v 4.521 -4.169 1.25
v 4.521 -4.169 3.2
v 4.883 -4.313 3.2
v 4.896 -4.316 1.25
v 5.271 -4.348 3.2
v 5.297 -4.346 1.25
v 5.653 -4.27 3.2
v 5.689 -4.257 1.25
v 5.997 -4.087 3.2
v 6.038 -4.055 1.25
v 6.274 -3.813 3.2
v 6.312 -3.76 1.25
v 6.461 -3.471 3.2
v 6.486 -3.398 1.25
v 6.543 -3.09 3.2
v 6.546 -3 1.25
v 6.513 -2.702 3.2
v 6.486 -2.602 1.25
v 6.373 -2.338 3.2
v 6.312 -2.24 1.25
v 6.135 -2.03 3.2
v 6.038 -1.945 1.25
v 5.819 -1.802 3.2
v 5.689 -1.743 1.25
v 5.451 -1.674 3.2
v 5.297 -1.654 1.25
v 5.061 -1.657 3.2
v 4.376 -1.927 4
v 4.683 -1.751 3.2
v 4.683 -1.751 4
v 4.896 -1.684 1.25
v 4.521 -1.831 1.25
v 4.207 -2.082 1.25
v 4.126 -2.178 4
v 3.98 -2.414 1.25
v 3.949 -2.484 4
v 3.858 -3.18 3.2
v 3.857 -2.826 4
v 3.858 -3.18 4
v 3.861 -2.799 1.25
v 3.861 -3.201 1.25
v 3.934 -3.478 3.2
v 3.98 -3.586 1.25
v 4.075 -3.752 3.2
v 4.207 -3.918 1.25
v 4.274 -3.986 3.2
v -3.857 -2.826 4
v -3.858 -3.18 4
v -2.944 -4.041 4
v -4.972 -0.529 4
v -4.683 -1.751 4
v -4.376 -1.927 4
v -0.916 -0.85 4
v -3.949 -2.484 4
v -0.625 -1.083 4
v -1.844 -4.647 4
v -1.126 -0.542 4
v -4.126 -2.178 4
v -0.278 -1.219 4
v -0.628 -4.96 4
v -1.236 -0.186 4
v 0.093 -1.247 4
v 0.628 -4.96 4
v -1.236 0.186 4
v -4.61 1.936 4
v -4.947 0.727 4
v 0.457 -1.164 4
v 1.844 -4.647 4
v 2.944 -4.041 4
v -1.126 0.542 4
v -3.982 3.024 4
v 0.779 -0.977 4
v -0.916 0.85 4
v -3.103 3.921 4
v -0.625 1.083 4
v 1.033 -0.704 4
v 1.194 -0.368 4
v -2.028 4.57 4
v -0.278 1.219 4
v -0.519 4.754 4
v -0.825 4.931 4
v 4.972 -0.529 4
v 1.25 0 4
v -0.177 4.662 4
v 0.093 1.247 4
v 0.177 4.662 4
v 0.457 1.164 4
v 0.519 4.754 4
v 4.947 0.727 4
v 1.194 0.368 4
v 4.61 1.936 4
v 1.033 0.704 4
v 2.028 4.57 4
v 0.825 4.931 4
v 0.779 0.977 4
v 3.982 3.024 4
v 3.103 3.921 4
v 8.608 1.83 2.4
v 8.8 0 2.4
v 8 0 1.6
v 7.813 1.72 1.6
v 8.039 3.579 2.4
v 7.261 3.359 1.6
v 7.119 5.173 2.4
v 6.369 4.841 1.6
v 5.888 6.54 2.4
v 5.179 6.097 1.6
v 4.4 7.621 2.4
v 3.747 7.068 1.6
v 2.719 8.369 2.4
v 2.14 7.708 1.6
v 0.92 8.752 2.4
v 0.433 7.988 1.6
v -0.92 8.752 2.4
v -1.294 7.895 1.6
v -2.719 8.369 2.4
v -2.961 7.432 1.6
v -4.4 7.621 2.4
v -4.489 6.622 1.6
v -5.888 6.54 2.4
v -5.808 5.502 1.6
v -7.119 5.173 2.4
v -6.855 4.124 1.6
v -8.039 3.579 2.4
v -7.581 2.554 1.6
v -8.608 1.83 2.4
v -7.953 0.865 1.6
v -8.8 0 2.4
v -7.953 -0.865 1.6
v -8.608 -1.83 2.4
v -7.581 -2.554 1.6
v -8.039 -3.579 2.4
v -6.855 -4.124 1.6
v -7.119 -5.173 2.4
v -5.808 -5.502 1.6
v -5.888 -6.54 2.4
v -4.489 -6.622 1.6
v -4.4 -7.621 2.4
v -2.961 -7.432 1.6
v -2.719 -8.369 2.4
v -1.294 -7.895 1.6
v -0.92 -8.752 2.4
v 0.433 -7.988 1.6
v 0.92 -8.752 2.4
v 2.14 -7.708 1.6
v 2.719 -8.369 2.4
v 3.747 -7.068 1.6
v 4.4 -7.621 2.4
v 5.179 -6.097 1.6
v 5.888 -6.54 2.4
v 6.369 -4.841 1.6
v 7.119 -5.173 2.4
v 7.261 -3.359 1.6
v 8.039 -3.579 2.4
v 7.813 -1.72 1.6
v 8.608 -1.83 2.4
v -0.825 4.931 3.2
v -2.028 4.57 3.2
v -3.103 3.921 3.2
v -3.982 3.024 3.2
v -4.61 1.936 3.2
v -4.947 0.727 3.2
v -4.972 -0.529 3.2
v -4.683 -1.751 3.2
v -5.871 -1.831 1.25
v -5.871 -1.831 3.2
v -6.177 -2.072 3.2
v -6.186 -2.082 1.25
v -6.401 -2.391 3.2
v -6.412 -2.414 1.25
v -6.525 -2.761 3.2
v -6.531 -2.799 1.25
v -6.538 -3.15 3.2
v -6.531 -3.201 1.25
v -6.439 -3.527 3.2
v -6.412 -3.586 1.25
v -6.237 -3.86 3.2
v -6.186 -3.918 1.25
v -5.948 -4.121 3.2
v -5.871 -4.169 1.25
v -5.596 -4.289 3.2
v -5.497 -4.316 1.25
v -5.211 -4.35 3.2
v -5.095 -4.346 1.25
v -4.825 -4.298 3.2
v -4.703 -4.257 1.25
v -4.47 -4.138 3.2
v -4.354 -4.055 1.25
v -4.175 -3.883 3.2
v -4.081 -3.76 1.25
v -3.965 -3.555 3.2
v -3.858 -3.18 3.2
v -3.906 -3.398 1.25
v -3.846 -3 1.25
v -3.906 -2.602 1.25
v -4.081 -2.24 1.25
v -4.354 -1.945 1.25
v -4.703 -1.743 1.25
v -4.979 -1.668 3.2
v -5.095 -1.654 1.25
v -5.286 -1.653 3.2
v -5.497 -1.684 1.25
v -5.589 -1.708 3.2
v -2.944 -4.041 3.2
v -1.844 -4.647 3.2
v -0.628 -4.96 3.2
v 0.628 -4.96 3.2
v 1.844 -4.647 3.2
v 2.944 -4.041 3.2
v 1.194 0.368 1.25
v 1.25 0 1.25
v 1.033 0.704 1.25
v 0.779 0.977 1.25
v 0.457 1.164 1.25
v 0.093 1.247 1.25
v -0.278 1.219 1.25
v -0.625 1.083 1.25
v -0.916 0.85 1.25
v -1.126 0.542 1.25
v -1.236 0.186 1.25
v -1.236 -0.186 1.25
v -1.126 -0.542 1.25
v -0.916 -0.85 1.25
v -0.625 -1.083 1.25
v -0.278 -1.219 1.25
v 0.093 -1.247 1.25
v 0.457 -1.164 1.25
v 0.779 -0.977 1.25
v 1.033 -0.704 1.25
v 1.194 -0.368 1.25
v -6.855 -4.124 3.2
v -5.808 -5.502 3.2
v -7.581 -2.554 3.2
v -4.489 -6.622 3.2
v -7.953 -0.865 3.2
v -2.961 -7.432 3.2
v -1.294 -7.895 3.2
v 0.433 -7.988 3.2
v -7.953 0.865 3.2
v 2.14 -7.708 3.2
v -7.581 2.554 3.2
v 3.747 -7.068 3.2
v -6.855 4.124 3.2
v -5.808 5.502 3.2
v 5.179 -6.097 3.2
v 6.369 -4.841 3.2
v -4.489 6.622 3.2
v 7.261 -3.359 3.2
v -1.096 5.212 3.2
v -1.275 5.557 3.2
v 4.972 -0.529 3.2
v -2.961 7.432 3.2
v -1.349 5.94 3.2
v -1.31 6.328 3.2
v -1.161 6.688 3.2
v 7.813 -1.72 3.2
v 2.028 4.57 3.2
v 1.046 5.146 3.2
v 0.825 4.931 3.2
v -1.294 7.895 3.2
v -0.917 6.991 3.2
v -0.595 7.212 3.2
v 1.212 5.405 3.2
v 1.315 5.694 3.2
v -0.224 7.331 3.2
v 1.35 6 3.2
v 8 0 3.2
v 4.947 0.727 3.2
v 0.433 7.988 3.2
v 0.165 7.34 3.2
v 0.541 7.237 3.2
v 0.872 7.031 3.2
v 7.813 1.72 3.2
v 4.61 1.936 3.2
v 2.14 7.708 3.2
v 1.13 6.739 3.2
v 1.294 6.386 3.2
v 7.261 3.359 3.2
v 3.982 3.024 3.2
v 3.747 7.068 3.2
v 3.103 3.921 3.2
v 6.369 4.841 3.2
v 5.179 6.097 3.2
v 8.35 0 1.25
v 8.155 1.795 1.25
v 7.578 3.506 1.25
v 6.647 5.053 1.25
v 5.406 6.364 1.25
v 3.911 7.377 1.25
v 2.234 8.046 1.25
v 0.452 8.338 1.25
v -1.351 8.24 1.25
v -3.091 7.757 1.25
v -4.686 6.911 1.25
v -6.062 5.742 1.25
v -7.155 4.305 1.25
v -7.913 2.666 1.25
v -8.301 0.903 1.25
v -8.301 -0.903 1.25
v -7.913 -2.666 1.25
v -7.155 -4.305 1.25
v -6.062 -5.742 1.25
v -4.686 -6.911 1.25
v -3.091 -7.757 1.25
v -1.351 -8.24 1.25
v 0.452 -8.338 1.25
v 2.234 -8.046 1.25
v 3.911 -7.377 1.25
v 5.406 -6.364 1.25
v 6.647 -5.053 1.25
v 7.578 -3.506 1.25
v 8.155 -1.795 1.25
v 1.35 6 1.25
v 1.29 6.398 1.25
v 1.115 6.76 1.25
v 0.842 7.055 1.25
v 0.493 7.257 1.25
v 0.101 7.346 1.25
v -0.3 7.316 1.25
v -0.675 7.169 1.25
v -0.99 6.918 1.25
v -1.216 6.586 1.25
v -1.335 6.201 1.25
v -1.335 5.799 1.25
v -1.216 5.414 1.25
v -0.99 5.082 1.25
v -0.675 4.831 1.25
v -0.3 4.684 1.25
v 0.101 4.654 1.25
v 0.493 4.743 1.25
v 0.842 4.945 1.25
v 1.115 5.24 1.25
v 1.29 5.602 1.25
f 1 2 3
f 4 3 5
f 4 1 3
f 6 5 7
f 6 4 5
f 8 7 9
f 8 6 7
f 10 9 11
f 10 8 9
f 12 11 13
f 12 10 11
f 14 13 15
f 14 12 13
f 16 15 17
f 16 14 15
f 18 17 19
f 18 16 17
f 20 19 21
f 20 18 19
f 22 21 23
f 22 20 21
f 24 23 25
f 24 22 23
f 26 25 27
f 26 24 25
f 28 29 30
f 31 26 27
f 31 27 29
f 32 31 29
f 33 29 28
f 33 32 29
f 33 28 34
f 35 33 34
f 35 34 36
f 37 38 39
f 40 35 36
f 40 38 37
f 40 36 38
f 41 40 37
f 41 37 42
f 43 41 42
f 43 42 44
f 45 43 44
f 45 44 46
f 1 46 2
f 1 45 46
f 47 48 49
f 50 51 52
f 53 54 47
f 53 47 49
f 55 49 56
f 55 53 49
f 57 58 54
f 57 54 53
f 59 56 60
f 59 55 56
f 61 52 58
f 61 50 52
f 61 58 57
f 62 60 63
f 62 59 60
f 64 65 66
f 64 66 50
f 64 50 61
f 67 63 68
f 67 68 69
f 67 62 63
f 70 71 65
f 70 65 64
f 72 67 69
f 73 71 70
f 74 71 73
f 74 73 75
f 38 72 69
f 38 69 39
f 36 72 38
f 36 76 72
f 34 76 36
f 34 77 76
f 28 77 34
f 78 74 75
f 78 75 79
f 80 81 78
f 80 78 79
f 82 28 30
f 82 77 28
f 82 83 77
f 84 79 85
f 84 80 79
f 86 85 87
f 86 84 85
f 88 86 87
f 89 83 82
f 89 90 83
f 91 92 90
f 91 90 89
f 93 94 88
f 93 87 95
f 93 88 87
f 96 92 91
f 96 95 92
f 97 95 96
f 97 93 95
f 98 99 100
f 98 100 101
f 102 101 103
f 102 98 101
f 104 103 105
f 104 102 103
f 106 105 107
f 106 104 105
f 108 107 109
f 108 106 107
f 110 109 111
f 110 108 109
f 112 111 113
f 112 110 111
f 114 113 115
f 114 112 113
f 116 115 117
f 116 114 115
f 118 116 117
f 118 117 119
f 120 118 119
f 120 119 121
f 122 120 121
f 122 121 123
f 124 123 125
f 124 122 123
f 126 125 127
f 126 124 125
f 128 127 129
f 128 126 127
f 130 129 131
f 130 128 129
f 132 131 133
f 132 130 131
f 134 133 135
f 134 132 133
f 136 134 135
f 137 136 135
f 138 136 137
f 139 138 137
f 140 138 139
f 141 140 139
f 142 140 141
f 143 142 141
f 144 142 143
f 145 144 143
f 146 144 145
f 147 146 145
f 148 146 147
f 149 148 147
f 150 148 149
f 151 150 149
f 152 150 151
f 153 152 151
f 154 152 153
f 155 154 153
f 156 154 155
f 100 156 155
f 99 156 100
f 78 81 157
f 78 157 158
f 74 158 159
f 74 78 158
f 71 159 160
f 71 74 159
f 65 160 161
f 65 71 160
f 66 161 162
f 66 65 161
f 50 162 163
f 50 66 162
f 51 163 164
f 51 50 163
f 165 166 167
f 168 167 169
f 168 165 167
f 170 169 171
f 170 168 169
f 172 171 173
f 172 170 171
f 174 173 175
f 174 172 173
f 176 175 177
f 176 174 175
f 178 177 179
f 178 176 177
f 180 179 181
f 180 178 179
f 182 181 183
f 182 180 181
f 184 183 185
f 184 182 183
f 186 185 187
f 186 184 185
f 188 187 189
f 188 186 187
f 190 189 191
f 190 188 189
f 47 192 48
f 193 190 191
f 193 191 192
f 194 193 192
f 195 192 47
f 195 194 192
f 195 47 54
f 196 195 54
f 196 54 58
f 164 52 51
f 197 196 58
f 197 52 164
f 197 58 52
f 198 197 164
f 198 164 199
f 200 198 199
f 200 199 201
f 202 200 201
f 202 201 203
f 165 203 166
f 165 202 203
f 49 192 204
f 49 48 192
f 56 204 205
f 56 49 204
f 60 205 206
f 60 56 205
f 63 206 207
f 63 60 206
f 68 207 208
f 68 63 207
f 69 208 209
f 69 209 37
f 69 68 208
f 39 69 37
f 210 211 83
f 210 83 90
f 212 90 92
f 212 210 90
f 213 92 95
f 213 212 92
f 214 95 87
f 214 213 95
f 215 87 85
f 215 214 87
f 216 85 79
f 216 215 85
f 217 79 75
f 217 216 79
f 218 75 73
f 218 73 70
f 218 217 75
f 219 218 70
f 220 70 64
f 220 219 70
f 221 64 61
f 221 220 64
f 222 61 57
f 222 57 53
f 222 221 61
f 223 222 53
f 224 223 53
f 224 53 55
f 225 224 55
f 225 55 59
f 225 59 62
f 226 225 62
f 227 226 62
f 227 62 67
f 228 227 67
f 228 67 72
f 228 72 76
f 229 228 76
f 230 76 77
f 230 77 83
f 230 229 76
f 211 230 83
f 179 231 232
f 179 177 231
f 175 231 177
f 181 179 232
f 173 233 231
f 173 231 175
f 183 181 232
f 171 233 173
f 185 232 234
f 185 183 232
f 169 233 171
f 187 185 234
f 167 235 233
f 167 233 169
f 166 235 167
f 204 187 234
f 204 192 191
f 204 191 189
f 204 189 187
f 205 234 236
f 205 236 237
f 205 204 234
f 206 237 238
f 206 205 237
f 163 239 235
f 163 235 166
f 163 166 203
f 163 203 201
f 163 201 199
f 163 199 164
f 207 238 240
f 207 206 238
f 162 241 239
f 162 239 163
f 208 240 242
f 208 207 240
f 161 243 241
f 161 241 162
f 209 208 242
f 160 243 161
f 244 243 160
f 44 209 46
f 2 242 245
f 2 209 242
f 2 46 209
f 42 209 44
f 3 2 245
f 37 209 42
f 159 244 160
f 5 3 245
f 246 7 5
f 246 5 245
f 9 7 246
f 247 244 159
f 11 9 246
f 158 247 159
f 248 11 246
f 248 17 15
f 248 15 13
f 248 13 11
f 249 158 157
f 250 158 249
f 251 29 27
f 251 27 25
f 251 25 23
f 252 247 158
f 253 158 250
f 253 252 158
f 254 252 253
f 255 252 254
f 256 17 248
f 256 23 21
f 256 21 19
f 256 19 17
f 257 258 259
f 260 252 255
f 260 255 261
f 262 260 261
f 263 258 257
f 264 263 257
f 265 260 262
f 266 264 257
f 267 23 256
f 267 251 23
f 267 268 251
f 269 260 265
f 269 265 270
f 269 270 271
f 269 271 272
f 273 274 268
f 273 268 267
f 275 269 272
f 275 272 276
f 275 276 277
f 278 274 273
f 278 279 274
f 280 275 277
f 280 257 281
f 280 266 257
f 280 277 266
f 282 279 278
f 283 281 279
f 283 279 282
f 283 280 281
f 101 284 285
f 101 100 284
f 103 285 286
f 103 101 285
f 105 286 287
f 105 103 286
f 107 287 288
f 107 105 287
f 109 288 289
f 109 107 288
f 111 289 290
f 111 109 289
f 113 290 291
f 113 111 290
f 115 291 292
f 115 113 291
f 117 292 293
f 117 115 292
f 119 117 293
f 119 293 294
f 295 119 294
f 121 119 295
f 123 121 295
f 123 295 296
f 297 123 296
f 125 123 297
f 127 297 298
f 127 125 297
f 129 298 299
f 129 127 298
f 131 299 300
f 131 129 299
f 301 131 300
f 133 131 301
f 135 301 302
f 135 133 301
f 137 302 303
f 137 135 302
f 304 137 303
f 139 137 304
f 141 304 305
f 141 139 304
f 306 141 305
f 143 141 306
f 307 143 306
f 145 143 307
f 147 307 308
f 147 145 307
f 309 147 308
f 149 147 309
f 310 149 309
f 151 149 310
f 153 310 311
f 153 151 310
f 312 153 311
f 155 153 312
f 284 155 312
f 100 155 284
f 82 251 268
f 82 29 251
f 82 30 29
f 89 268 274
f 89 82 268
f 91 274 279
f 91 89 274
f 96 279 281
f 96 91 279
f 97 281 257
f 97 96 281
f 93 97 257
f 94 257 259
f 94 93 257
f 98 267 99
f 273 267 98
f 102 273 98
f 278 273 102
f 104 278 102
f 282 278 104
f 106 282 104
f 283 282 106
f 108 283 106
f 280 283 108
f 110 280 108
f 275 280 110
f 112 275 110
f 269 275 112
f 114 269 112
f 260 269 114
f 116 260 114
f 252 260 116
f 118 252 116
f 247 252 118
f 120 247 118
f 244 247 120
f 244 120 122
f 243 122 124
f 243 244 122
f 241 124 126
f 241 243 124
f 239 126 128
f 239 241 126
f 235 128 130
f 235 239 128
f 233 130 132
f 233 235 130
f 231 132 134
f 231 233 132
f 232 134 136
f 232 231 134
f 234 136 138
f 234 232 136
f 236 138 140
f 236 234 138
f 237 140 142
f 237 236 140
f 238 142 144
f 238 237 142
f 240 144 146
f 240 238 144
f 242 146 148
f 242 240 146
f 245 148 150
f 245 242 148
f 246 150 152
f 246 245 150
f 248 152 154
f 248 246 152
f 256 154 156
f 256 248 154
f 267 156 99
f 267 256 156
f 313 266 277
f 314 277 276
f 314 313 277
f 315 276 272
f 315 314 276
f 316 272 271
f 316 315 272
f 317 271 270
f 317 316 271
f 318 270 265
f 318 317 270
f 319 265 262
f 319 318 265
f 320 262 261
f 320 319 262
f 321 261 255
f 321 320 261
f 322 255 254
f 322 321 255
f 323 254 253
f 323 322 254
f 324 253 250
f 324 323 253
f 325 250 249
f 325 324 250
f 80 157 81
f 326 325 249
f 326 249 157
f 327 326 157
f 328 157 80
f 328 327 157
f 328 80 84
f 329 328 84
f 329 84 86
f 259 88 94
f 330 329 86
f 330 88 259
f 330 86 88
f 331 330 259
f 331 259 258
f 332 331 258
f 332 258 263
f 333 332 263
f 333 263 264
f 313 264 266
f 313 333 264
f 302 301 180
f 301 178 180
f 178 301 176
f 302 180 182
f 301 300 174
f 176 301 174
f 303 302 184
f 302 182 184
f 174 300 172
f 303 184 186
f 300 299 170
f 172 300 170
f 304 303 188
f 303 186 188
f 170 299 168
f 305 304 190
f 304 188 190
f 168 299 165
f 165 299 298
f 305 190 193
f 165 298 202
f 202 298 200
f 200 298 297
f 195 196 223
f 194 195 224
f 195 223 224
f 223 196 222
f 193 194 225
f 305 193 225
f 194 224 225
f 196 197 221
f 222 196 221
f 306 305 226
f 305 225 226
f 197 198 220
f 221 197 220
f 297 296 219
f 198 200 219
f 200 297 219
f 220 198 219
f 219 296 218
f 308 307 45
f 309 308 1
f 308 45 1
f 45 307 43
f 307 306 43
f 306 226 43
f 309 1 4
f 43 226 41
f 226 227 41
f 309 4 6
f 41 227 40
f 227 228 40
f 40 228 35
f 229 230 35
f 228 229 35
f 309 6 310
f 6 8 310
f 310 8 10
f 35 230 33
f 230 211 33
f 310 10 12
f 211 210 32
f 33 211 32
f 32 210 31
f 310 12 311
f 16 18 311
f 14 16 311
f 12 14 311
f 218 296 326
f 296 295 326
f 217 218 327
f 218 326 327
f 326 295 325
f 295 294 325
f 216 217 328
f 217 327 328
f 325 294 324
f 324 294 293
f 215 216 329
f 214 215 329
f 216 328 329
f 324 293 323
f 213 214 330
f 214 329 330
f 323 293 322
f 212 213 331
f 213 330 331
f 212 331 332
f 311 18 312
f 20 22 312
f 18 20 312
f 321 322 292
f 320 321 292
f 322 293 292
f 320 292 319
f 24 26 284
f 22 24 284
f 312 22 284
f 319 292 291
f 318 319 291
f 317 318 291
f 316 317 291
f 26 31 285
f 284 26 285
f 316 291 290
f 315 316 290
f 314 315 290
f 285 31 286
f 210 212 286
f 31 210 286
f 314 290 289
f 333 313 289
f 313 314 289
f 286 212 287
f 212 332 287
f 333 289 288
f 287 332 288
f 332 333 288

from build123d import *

# Parameters (mm, degrees)
CYLINDER002_R     = 20
CYLINDER002_DEPTH = 20
CYLINDER001_R     = 1.35
CYLINDER001_DEPTH = 10
ARRAY001_COUNT    = 3
CYLINDER_R        = 4.1
CYLINDER_DEPTH    = 2.25
SKETCH002_W       = 5
SKETCH002_H       = 4.7
ARRAY_Z_COUNT     = 6
ARRAY_Z_PITCH     = 1.6


with BuildPart() as upperdomain:
    # Cylinder002 → Cylinder002 (new body)
    with BuildSketch(Plane.XY.offset(1.25)):
        Circle(CYLINDER002_R)
    extrude(amount=CYLINDER002_DEPTH)


with BuildPart() as dins913:
    # Cylinder001 → Cylinder001 (new body)
    with BuildSketch(Plane(origin=(0, 6, -4), x_dir=(1, 0, 0), z_dir=(0, 0, 1))):
        Circle(CYLINDER001_R)
    extrude(amount=CYLINDER001_DEPTH)

    # Array001: DINs913 ×3 about axis
    array001_axis = Axis((0, 0, 0), (0, 0, 1))


with BuildPart() as dins913_1:
    add(dins913.part)
    for i in range(1, ARRAY001_COUNT):
        add(dins913.part.rotate(array001_axis, i * 360 / ARRAY001_COUNT))


with BuildPart() as lensfit:
    # Cylinder → Cylinder (new body)
    with BuildSketch(Plane.XY.offset(-1)):
        Circle(CYLINDER_R)
    extrude(amount=CYLINDER_DEPTH)


with BuildPart() as innergroovedom001:
    # Sketch002 → Revolution002 (revolve)
    with BuildSketch(Plane.XZ):
        with Locations((7.5, 0.85)):
            Rectangle(SKETCH002_W, SKETCH002_H)
    revolve(axis=Axis((0, 0, 0), (0, 0, 1)))


with BuildPart() as innergroovetool:
    # Sketch001 → Revolution001 (revolve)
    with BuildSketch(Plane.XZ):
        Polygon((4, 3.2), (4, 1.6), (8, 1.6), (8.8, 2.4), (8, 3.2), align=None)
    revolve(axis=Axis((0, 0, 0), (0, 0, 1)))

    # Array Z: InnerGrooveTool ×6


with BuildPart() as innergroovetool_1:
    add(innergroovetool.part)
    with Locations(*[(0, 0, -i * ARRAY_Z_PITCH) for i in range(1, ARRAY_Z_COUNT)]):
        add(innergroovetool.part)

    # Common: intersect InnerGrooveDom001
    add(innergroovedom001.part, mode=Mode.INTERSECT)


with BuildPart() as lid:
    # Sketch → Revolution (revolve)
    with BuildSketch(Plane.XZ):
        Polygon((1.25, 4), (1.25, -1.5), (8, -1.5), (8, 3.2), (5, 3.2), (5, 4), align=None)
    revolve(axis=Axis((0, 0, 0), (0, 0, 1)))

    # Fusion001: union InnerGrooveTool
    add(innergroovetool_1.part)

    # Cut: cut LensFit
    add(lensfit.part, mode=Mode.SUBTRACT)

    # Cut001: cut DINs913
    add(dins913_1.part, mode=Mode.SUBTRACT)

    # Common001: intersect UpperDomain
    add(upperdomain.part, mode=Mode.INTERSECT)


solid = lid.part
